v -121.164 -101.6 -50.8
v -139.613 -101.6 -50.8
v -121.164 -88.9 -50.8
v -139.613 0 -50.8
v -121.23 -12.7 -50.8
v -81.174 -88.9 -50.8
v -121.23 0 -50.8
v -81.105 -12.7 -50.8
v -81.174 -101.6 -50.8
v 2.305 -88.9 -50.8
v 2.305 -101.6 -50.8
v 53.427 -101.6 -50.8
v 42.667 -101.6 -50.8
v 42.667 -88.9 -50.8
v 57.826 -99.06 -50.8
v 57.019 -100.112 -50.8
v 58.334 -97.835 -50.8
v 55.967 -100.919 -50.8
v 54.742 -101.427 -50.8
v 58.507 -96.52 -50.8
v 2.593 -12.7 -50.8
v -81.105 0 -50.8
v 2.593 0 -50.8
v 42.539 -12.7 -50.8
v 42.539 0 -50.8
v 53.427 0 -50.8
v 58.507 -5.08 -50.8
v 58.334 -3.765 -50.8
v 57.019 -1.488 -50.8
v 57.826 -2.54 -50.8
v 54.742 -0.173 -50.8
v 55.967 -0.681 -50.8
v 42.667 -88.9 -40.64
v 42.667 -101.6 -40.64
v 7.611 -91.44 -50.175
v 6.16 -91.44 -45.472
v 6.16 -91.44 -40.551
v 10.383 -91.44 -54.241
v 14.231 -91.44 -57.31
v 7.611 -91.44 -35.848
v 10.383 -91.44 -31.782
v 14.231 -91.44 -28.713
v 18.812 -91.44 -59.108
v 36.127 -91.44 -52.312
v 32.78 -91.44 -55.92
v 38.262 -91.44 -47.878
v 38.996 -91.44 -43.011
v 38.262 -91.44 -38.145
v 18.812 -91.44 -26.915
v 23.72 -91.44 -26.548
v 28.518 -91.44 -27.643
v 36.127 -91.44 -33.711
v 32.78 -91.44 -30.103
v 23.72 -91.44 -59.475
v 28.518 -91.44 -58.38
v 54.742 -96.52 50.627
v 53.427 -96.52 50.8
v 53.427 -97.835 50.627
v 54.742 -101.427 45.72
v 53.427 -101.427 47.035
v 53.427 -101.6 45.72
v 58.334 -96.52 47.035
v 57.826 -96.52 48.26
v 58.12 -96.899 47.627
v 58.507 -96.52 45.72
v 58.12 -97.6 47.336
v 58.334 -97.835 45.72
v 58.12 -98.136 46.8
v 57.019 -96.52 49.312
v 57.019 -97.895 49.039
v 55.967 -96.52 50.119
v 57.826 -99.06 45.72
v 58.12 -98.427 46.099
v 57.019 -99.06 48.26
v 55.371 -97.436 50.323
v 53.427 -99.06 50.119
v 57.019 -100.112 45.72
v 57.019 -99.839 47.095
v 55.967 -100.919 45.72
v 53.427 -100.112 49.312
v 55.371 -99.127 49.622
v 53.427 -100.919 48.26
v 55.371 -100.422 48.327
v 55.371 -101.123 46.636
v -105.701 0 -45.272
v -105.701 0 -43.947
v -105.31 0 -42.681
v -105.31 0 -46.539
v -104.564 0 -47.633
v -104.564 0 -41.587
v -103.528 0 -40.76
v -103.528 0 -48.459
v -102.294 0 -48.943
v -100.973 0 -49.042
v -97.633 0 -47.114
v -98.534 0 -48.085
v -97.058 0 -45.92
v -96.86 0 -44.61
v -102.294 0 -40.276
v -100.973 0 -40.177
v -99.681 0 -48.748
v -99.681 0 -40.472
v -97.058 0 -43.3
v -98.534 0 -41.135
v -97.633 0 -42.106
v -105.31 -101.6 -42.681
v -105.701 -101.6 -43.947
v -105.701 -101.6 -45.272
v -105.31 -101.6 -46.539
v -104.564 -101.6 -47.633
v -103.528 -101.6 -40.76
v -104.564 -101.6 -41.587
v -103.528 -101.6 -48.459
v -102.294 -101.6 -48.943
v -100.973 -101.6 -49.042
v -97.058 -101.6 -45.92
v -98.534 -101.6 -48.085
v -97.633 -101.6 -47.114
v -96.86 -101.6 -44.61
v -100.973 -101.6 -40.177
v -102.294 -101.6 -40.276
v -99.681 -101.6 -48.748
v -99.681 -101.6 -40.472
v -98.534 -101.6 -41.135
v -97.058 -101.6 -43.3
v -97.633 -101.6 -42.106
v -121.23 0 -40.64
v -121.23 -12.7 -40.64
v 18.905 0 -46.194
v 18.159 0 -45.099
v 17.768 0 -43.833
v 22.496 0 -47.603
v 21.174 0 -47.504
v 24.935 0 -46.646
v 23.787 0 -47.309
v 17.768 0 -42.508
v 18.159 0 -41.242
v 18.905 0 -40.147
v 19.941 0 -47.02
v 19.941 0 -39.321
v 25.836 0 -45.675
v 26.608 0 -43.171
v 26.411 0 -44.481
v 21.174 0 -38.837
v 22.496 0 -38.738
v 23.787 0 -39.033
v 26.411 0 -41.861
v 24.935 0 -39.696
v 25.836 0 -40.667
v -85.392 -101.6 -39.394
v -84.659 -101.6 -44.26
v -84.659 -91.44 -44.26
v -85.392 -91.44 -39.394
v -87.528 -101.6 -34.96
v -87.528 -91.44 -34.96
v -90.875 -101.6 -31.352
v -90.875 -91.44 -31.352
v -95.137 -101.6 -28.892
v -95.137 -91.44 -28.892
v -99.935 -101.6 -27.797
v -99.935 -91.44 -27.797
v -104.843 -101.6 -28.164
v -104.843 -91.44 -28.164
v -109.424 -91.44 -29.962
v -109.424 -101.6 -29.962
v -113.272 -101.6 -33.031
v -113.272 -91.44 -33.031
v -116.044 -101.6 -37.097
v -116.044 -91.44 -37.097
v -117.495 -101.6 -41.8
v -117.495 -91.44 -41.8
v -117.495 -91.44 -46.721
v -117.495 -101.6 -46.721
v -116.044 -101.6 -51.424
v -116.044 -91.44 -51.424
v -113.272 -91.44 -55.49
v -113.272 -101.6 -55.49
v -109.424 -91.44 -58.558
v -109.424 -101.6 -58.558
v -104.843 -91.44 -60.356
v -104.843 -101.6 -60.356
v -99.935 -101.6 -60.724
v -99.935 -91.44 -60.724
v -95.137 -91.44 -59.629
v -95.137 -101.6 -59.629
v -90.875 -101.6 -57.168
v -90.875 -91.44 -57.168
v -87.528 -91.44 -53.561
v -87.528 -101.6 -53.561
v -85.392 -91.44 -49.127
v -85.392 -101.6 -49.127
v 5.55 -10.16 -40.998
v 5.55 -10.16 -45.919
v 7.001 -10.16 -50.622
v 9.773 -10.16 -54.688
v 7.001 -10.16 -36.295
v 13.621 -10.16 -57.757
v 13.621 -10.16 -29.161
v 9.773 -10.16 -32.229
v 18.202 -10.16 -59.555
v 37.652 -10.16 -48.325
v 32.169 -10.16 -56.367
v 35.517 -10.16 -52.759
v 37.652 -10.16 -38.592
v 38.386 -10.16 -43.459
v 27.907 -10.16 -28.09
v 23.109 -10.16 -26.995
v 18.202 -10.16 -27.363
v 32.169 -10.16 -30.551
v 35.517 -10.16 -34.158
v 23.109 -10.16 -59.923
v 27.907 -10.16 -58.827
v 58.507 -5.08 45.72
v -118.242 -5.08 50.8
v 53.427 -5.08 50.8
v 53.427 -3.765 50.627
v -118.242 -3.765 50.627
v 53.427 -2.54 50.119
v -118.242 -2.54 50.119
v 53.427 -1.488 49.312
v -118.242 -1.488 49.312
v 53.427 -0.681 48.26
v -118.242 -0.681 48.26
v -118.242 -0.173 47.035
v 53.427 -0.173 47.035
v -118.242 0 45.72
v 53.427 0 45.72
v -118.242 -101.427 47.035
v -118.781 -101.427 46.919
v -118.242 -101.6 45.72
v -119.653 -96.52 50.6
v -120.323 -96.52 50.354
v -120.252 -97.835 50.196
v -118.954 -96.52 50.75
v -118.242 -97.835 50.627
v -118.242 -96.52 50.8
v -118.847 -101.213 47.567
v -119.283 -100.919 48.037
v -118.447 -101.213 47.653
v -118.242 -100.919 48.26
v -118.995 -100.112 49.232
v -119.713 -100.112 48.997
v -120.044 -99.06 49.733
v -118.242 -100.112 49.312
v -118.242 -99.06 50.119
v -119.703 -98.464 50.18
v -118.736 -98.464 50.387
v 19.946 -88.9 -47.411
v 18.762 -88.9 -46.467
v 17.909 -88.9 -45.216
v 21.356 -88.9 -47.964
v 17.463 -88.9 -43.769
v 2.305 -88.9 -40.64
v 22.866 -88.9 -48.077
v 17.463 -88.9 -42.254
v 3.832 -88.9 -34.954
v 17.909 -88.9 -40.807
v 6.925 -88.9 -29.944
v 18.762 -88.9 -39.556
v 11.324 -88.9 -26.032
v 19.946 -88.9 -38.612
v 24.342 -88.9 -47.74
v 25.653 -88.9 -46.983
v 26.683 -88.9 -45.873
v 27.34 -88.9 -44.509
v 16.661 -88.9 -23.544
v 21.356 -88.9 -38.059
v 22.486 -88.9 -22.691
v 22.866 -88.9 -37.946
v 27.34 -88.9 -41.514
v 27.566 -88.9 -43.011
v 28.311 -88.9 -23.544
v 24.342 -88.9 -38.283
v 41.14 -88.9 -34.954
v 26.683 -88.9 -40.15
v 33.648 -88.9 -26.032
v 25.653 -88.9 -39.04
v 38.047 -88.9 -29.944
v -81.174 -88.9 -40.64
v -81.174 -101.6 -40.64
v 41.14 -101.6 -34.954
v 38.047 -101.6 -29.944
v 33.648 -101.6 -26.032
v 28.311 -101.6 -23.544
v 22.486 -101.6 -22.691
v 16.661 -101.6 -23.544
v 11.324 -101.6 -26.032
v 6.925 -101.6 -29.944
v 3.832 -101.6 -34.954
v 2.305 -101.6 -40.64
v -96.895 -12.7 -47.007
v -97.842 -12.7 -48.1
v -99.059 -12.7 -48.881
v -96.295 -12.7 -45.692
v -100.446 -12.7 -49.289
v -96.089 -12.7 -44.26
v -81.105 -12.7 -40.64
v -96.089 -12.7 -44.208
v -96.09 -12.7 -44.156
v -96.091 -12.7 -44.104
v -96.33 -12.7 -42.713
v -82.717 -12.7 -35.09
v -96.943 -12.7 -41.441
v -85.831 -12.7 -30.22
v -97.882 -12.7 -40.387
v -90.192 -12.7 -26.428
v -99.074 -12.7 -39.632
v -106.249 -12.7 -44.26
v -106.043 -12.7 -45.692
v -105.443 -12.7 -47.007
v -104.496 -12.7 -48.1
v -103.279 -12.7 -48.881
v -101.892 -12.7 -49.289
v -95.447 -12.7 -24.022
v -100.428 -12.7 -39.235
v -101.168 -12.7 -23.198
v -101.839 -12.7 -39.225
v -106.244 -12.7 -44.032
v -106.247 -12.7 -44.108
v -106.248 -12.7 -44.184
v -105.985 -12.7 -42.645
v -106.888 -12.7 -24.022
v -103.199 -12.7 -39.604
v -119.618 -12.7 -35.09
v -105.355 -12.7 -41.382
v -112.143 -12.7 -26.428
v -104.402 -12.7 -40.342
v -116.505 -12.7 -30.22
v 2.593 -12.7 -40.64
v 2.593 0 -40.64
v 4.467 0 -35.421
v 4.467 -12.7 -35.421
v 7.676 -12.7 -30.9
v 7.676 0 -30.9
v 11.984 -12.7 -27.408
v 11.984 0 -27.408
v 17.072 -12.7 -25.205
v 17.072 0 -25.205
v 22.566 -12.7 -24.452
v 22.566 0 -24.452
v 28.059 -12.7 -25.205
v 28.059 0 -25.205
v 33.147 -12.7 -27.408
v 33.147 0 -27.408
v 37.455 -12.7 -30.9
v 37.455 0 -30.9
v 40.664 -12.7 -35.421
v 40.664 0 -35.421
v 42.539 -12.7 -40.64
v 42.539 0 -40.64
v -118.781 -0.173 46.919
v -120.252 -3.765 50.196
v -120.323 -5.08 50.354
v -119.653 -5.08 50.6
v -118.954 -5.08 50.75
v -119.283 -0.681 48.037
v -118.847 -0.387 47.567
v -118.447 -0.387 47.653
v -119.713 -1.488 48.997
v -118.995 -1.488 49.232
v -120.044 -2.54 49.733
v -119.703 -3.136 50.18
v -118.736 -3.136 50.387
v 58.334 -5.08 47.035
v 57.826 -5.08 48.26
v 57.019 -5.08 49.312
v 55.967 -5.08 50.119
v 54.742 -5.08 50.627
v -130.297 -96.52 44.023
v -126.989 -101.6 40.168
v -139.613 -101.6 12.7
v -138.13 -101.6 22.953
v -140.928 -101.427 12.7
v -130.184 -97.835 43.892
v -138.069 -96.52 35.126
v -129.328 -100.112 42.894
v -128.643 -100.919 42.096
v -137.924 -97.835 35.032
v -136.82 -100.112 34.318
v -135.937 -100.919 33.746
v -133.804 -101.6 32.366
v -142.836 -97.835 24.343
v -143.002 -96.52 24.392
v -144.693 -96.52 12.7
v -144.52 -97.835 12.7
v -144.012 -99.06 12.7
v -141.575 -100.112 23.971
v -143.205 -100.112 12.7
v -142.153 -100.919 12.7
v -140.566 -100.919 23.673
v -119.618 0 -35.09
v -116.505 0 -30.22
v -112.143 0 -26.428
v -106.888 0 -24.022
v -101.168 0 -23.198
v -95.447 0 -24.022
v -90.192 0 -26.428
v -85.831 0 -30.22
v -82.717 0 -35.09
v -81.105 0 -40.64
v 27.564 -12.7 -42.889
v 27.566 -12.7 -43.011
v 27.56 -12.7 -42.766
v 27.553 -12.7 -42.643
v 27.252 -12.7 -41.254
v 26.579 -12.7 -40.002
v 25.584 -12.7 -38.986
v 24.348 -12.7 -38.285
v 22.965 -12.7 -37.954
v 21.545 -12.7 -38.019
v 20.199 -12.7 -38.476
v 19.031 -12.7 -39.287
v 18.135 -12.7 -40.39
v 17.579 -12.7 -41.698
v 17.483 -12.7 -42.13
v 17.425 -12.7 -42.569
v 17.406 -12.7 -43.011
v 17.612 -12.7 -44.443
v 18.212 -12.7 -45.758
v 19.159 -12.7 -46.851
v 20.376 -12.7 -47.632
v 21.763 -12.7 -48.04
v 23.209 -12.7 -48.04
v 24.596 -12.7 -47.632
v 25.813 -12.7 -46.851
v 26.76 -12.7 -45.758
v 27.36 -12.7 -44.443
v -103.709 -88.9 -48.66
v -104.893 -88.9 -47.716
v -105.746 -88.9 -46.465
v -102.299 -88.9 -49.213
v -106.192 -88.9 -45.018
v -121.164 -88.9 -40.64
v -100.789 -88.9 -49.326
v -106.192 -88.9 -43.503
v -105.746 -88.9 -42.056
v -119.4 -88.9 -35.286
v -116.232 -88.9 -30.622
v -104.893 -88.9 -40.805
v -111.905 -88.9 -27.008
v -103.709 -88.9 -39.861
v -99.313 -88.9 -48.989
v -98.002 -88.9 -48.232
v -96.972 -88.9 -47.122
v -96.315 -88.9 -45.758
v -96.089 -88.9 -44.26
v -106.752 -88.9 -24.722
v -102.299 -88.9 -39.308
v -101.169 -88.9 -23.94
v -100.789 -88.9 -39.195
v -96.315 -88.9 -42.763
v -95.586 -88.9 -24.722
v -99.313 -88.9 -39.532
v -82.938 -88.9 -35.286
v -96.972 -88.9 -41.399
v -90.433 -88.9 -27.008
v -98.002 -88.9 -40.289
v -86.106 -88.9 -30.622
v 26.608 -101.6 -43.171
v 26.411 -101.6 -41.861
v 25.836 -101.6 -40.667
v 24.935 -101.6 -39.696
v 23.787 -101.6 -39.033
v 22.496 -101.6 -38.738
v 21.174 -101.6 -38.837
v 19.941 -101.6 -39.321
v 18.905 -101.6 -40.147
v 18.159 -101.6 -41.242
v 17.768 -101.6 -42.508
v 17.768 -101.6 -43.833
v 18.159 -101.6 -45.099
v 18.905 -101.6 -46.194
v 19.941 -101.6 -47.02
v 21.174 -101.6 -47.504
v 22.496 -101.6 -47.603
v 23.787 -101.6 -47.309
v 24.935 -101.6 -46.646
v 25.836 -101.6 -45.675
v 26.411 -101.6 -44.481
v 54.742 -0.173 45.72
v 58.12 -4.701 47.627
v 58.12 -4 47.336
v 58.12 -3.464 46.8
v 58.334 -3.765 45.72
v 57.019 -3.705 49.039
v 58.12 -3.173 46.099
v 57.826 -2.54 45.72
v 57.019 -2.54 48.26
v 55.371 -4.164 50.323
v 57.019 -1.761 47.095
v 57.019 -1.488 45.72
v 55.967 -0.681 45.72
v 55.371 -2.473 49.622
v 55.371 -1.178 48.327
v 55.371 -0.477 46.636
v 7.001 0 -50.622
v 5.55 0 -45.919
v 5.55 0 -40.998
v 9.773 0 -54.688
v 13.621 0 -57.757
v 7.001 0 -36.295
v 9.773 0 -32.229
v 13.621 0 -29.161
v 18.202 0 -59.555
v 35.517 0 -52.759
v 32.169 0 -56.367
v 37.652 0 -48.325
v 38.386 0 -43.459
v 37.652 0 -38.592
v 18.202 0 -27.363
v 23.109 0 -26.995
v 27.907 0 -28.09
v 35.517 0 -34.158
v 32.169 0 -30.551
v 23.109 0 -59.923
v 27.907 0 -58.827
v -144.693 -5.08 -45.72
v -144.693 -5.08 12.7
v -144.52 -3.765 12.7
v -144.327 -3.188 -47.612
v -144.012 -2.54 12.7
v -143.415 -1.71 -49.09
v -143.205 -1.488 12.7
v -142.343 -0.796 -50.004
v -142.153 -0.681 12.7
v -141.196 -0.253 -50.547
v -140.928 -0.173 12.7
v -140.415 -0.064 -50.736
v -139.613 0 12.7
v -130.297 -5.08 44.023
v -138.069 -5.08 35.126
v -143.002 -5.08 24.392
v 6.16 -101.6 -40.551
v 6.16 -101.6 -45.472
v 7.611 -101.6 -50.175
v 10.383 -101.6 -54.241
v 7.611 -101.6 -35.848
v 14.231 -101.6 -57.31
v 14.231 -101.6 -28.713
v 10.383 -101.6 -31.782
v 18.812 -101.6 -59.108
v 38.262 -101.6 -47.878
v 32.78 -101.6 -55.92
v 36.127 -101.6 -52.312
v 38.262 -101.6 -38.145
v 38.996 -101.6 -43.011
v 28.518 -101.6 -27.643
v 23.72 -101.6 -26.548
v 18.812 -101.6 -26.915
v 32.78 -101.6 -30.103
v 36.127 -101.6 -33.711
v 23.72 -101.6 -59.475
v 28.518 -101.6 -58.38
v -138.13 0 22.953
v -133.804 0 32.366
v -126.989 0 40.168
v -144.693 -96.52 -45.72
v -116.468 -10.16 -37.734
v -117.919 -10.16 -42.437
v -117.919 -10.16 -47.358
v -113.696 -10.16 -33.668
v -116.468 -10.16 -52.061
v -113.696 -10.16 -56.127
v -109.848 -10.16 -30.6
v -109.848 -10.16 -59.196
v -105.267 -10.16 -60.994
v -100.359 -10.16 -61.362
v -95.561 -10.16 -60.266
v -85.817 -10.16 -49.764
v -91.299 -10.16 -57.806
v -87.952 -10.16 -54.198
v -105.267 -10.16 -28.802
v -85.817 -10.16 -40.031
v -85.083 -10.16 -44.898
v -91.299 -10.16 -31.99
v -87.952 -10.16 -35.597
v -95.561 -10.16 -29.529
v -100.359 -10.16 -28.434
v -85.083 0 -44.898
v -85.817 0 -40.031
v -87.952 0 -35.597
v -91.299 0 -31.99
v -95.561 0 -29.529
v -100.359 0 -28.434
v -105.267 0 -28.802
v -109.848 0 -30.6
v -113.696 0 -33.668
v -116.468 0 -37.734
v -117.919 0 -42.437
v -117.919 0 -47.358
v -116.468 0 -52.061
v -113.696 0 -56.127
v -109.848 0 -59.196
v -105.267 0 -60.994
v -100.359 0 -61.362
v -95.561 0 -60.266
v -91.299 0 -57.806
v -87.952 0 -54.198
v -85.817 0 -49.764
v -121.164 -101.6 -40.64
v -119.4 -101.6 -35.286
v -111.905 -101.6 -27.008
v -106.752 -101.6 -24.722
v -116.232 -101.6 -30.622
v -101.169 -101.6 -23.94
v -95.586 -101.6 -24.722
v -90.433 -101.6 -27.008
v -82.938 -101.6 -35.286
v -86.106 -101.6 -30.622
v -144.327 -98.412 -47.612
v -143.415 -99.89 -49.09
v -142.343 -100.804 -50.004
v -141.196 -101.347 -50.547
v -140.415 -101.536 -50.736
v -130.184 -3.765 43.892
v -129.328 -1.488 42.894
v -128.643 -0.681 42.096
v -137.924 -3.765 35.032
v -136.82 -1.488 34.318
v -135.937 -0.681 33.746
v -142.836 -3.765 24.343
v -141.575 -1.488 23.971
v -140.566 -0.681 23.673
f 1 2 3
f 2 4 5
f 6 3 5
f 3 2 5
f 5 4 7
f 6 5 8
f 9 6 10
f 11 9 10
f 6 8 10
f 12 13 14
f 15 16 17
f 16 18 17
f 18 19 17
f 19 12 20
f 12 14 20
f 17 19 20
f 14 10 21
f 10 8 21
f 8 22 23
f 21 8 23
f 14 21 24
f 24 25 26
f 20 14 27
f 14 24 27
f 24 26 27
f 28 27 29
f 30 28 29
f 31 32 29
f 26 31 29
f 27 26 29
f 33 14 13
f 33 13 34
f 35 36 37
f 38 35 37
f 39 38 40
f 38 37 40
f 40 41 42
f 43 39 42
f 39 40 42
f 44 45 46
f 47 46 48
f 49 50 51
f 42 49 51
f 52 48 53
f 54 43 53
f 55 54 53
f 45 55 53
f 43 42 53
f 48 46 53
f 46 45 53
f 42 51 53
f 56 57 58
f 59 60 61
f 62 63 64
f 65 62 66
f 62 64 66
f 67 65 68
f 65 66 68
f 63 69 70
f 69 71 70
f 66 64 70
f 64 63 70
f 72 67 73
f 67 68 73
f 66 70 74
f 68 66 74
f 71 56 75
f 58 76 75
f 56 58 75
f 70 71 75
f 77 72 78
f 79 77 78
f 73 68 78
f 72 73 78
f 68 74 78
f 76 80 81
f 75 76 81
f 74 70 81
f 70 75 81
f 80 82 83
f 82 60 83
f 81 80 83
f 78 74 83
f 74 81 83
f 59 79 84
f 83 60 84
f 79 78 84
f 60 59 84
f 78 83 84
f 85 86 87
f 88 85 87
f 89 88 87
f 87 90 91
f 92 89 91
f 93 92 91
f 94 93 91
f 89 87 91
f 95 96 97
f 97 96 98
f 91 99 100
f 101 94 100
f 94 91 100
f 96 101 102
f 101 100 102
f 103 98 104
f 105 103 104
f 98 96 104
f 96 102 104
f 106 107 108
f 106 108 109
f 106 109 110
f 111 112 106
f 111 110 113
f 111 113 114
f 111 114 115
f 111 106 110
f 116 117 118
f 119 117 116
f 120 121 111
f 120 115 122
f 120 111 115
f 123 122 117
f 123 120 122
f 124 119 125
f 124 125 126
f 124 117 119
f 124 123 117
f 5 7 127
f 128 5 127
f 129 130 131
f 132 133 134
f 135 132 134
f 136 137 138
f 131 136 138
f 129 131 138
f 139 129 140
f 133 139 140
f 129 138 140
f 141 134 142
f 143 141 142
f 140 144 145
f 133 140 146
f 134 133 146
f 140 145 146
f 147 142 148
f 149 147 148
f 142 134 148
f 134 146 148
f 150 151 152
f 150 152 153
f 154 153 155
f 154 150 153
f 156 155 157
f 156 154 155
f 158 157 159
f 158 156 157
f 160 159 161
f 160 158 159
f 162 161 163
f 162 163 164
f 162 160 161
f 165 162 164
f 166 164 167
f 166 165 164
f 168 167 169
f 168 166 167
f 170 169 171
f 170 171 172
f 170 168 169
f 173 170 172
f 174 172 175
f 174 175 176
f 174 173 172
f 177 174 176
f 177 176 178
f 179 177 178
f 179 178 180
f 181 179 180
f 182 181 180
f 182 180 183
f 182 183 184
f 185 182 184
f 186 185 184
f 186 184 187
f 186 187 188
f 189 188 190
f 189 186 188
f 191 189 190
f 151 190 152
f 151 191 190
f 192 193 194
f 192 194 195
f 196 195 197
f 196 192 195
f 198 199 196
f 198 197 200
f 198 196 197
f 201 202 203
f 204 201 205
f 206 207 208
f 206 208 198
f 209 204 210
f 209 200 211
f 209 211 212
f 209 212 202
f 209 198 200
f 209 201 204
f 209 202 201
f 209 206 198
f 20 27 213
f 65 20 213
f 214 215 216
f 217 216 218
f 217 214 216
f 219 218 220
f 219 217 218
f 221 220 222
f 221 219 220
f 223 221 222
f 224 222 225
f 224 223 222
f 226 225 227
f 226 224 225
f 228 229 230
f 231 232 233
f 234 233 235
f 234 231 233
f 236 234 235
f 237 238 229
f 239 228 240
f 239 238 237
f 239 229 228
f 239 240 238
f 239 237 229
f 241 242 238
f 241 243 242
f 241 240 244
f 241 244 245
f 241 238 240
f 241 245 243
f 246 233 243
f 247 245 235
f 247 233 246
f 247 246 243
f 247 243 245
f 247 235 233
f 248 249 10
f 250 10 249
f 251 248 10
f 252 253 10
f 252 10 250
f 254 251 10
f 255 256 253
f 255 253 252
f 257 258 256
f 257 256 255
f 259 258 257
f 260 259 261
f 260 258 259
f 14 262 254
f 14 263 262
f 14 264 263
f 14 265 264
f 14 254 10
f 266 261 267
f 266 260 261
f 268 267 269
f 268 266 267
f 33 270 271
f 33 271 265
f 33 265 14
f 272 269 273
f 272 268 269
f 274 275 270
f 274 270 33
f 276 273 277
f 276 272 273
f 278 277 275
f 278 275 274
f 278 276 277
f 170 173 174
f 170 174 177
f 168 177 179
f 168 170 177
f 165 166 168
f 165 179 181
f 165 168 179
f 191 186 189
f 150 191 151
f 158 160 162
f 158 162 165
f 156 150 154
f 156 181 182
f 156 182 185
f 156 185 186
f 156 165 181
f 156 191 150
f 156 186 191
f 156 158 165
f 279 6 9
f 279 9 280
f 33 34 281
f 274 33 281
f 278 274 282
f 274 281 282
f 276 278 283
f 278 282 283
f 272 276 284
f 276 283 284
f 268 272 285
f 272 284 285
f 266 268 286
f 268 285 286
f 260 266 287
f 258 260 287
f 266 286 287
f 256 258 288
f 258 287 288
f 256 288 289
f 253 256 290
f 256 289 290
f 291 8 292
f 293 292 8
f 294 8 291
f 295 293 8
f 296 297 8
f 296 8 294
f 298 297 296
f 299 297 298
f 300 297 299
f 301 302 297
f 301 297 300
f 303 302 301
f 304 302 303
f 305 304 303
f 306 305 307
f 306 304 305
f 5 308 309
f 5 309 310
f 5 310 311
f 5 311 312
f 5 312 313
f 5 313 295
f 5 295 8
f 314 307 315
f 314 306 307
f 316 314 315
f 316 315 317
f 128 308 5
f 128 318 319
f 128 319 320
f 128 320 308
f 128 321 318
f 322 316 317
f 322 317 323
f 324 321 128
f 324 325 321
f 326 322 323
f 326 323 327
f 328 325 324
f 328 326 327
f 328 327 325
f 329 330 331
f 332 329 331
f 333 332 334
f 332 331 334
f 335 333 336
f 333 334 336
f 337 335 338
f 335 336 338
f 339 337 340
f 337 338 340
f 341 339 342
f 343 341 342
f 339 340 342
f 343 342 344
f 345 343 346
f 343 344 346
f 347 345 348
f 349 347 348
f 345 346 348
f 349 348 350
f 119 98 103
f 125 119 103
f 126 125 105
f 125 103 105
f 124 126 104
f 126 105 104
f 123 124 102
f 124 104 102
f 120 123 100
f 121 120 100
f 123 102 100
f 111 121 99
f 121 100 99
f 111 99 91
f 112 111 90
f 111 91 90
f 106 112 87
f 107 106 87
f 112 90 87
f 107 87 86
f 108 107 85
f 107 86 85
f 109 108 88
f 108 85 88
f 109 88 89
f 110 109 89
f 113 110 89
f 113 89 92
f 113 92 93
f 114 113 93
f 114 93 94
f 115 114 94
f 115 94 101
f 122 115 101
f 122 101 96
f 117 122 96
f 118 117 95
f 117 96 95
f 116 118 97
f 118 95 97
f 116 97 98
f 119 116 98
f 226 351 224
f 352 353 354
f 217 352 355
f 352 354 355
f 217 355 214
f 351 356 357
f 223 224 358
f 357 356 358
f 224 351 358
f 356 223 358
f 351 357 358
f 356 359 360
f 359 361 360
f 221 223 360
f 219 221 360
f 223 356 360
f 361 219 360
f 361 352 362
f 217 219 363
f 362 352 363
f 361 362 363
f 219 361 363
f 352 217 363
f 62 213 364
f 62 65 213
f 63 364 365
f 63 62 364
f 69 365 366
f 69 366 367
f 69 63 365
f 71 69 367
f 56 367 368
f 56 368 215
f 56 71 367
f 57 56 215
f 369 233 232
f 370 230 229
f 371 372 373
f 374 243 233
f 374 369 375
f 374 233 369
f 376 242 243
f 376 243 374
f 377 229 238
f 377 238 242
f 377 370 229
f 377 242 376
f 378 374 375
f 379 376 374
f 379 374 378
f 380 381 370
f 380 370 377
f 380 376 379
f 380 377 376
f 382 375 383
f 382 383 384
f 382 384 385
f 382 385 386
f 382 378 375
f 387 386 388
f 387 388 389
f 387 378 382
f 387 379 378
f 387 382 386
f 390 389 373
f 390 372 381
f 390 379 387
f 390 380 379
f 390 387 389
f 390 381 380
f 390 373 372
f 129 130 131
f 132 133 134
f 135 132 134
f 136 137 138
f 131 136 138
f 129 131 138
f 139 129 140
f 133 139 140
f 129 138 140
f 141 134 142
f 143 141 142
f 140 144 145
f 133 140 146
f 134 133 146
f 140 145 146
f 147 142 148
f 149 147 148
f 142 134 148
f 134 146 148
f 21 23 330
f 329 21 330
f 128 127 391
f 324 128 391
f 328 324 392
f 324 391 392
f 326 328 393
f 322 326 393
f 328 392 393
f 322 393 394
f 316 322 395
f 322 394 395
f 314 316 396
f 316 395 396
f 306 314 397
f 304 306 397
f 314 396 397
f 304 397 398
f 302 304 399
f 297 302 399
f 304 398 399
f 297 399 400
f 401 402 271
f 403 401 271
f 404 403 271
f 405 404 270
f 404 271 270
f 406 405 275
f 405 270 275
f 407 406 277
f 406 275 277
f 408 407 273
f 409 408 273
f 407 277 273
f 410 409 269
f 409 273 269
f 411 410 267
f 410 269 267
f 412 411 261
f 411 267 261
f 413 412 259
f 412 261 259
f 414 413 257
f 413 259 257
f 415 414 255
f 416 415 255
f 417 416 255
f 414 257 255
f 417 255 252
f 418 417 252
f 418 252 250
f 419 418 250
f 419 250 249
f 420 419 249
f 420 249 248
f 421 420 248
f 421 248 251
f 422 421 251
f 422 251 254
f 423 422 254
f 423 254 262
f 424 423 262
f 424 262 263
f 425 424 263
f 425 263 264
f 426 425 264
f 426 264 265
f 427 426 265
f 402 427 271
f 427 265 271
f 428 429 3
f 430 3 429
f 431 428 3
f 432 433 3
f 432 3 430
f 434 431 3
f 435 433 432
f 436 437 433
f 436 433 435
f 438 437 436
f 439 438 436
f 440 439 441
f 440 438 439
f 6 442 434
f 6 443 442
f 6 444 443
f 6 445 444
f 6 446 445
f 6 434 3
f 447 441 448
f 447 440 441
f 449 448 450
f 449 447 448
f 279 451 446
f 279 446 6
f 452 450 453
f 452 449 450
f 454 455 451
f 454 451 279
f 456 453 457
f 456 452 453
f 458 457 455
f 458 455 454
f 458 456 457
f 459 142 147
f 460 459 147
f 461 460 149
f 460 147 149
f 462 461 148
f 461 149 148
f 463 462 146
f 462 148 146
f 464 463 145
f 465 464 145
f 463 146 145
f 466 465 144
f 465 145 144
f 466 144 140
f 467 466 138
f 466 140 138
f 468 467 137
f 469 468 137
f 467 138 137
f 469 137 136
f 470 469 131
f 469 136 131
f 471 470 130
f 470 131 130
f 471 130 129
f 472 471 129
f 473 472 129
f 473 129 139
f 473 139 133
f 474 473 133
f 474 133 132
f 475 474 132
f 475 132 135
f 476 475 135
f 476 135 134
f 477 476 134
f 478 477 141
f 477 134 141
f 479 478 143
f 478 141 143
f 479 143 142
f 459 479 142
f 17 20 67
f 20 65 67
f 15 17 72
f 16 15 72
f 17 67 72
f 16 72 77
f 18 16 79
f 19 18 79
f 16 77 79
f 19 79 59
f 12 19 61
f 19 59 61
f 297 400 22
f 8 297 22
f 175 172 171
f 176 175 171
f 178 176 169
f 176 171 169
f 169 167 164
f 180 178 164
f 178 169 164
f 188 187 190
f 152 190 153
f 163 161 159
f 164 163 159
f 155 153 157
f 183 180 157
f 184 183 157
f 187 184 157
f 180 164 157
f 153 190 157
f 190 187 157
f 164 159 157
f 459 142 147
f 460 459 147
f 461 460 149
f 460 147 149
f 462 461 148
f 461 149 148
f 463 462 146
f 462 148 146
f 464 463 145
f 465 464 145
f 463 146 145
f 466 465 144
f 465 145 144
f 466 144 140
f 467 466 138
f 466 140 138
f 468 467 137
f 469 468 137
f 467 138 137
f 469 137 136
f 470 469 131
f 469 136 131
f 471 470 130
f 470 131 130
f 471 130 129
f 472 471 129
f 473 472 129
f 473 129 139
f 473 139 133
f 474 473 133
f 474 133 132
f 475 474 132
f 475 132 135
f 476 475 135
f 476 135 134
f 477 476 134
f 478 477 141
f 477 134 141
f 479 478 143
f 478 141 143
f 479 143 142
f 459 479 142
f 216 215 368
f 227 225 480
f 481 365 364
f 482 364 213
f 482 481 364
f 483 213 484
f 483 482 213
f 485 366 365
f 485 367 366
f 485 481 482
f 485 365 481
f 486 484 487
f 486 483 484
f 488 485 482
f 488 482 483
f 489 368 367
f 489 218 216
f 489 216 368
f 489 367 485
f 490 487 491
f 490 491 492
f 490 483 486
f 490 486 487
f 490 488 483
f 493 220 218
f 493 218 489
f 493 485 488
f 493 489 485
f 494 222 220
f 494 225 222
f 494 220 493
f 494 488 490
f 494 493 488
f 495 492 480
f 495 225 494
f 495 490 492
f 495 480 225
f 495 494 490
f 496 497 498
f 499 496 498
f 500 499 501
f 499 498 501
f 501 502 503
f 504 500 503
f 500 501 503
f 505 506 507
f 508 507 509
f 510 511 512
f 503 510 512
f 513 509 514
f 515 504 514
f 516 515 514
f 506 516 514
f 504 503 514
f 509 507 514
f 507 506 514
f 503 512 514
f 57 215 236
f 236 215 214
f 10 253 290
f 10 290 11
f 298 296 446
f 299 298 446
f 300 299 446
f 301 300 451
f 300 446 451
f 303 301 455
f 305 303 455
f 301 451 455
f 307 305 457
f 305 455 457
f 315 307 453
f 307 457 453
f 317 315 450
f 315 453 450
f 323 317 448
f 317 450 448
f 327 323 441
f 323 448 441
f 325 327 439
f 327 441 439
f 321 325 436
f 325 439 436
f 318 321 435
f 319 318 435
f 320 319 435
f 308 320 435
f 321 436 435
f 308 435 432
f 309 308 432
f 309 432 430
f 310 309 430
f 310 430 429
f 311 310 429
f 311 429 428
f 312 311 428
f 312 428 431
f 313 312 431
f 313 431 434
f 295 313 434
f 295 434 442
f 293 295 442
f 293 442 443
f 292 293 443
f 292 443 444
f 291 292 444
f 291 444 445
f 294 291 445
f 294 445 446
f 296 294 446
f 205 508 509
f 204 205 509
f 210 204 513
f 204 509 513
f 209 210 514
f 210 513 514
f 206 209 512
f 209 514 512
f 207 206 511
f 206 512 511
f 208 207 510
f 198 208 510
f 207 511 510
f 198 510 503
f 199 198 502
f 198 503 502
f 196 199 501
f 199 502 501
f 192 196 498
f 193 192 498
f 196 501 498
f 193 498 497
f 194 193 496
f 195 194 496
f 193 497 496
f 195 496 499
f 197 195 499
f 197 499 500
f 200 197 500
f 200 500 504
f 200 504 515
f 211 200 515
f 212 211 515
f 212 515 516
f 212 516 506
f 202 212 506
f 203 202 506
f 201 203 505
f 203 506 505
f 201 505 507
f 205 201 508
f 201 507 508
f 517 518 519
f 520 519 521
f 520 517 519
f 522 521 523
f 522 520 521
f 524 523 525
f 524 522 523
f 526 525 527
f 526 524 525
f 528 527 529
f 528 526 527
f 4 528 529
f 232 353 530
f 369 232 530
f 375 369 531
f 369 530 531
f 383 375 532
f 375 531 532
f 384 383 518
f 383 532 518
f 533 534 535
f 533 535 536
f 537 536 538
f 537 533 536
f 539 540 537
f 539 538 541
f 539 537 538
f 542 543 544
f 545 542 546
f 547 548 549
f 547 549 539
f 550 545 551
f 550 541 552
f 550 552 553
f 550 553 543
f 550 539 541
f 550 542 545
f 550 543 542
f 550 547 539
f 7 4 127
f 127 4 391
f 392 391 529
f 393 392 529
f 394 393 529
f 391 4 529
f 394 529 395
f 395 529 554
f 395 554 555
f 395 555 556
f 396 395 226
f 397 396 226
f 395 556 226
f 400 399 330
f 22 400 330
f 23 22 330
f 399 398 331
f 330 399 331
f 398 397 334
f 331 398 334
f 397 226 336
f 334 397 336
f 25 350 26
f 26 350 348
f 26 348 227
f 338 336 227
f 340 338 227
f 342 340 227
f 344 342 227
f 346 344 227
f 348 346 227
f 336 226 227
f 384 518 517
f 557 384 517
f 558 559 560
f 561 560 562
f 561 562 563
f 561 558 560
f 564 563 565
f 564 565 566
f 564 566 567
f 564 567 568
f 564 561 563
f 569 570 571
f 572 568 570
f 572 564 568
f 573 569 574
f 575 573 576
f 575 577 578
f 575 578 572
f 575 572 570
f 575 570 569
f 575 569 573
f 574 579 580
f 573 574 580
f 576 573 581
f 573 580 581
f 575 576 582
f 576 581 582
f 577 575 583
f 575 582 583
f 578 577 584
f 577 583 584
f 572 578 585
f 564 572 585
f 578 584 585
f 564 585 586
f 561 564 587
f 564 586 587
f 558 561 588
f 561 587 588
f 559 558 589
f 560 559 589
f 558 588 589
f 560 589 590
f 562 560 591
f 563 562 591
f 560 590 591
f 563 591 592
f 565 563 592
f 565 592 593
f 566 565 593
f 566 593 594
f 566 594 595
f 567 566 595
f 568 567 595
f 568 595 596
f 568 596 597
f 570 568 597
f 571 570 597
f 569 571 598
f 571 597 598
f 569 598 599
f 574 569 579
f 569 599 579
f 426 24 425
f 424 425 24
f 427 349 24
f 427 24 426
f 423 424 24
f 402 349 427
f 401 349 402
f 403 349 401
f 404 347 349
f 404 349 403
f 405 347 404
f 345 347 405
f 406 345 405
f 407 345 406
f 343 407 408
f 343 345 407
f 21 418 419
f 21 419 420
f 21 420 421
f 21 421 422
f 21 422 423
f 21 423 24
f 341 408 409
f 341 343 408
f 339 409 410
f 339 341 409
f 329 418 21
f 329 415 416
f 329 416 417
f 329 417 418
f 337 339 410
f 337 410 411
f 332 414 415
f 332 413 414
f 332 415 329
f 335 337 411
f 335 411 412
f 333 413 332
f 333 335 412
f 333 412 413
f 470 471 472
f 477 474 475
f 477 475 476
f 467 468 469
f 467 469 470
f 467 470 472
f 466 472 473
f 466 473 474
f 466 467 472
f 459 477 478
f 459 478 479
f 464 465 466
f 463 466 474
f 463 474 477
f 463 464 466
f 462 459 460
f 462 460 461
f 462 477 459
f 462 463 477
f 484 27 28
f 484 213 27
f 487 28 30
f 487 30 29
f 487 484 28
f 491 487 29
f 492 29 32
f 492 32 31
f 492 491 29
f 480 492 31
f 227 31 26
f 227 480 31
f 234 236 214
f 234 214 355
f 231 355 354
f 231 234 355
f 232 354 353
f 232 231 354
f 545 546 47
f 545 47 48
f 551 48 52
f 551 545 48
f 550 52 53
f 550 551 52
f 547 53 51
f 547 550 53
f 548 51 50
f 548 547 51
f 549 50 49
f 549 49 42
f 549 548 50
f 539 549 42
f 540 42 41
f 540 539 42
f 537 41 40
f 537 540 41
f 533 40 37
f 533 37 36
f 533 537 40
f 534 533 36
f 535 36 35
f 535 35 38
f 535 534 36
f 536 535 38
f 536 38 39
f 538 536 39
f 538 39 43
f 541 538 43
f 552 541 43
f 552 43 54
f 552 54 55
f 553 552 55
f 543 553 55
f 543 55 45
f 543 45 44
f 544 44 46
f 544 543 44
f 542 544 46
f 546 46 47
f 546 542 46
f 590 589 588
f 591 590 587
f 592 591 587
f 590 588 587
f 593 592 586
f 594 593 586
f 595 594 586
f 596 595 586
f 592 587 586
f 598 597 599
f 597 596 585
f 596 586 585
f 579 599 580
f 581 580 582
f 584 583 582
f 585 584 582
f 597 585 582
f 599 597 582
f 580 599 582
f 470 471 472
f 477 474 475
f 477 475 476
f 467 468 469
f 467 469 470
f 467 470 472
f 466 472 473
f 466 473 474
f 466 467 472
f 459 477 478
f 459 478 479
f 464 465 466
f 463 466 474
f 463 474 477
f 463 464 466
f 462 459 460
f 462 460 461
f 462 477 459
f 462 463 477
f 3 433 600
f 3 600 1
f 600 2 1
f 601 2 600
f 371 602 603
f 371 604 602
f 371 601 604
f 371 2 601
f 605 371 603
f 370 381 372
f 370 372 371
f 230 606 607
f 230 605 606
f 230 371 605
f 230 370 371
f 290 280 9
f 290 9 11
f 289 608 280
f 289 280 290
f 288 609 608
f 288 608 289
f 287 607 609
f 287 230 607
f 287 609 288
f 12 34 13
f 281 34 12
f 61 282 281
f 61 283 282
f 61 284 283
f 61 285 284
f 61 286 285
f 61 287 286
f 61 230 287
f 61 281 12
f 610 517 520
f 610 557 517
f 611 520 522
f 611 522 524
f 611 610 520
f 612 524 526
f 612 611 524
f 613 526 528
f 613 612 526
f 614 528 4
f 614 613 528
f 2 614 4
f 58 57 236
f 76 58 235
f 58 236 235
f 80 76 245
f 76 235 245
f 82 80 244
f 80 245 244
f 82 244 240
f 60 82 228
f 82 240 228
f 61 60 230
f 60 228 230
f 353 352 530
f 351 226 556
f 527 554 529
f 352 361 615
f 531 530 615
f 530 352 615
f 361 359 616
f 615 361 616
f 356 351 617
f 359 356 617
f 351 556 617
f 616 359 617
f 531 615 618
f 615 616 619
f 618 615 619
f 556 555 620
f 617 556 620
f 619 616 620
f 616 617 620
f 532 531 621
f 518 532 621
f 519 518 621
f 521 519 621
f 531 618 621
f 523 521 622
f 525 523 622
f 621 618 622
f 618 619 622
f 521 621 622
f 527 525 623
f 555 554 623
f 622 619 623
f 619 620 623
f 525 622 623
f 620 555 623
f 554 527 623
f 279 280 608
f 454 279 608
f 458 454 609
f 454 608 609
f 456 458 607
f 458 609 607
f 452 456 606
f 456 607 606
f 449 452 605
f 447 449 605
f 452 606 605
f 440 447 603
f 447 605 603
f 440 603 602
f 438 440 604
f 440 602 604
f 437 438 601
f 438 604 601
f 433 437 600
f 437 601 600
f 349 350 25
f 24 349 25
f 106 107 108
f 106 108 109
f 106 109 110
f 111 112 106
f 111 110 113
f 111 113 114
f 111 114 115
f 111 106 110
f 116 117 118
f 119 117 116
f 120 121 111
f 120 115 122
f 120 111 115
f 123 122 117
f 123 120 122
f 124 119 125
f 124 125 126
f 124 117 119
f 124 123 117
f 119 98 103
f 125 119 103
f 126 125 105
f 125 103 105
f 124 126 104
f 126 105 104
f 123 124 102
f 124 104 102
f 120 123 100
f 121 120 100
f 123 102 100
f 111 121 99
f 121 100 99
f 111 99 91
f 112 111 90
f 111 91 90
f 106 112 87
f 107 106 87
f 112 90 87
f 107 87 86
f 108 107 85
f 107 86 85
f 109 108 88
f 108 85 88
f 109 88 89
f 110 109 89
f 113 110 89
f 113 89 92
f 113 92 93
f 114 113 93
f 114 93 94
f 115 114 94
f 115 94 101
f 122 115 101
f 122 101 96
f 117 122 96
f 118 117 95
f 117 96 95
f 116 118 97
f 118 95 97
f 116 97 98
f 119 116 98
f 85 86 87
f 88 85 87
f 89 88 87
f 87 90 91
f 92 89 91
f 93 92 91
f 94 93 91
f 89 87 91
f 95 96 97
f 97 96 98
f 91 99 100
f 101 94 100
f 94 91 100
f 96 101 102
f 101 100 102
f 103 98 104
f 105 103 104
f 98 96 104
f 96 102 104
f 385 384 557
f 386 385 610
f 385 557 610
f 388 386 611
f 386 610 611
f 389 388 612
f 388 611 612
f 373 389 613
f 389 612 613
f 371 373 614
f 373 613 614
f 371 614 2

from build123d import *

# Parameters (mm, degrees)
F1_DEPTH  = 101.6
F2_R      = 5.08
F3_R      = 5.08
F4_DEPTH  = 12.7
F5_DEPTH  = 101.6
F7_DEPTH  = 12.7
F8_R      = 4.445
F9_DEPTH  = 101.6
F10_DEPTH = 101.6
F11_R     = 16.51
F12_DEPTH = 10.16
F13_R     = 16.51
F14_DEPTH = 10.16


with BuildPart() as f1:
    # F0 (on Front) → F1 (new body)
    with BuildSketch(Plane.XZ):
        with BuildLine():
            Line((58.5069581866, -50.8), (58.5069581866, 0))
            Line((58.5069581866, 0), (58.5069581866, 50.8))
            Line((58.5069581866, 50.8), (-119.2930418134, 50.8))
            ThreePointArc((-119.2930418134, 50.8), (-137.7609177122, 35.5952505992), (-144.6930418134, 12.7))
            Line((-144.6930418134, 12.7), (-144.6930418134, -50.8))
            Line((-144.6930418134, -50.8), (58.5069581866, -50.8))
        make_face()
    extrude(amount=F1_DEPTH)

    # F2
    f2_edges = [f1.edges().sort_by_distance(p)[0] for p in [
        (-30.393042, 0, 50.8),
        (-119.293042, -50.8, 50.8),
        (-137.760918, 0, 35.595251),
        (-144.693042, 0, -19.05),
        (-144.693042, -101.6, -19.05),
        (-137.760918, -101.6, 35.595251),
        (-30.393042, -101.6, 50.8),
        (58.506958, -50.8, 50.8),
        (58.506958, 0, 0),
        (58.506958, -101.6, 0),
        (-144.693042, -50.8, -50.8),
    ]]
    fillet(f2_edges, radius=F2_R)

    # F3 (on face) → F4 (cut)
    with BuildSketch(Plane.XZ.offset(101.6)):
        with BuildLine():
            Line((-121.1638599634, -40.64), (-121.1638599634, -50.8))
            Line((-121.1638599634, -50.8), (-81.1741036591, -50.8))
            Line((-81.1741036591, -50.8), (-81.1741036591, -40.64))
            ThreePointArc((-81.1741036591, -40.64), (-101.1689818113, -23.9403933046), (-121.1638599634, -40.64))
        make_face()
        with Locations((-101.1689818113, -44.2603933046)):
            Circle(F3_R, mode=Mode.SUBTRACT)
        with BuildLine():
            Line((2.304810565, -40.64), (2.304810565, -50.8))
            Line((2.304810565, -50.8), (42.6670909313, -50.8))
            Line((42.6670909313, -50.8), (42.6670909313, -40.64))
            ThreePointArc((42.6670909313, -40.64), (22.4859507481, -22.6914933917), (2.304810565, -40.64))
        make_face()
        with Locations((22.4859507481, -43.0114933917)):
            Circle(F3_R, mode=Mode.SUBTRACT)
    extrude(amount=-F4_DEPTH, mode=Mode.SUBTRACT)

    # F5 (cut): faces of the model
    f5_faces = [f1.faces().sort_by_distance(p)[0] for p in [
        (-101.1689818113, -101.6, -44.2603933046),
        (22.4859507481, -101.6, -43.0114933917),
    ]]
    extrude(f5_faces, amount=-F5_DEPTH, mode=Mode.SUBTRACT)

    # F6 (on face) → F7 (cut)
    with BuildSketch(Plane(origin=(0, 0, 0), x_dir=(-1, 0, 0), z_dir=(0, 1, 0))):
        with BuildLine():
            Line((-2.5926139206, -41.6983120407), (-17.5786139206, -41.6983120407))
            ThreePointArc((-17.5786139206, -41.6983120407), (-17.4493015106, -42.3492513982), (-17.4059507481, -43.0114933917))
            ThreePointArc((-17.4059507481, -43.0114933917), (-22.6701544481, -48.0881526276), (-27.5525920855, -42.6433282679))
            Line((-27.5525920855, -42.6433282679), (-42.5385920855, -42.6433282679))
            Line((-42.5385920855, -42.6433282679), (-42.5385920855, -50.8))
            Line((-42.5385920855, -50.8), (-2.5926139206, -50.8))
            Line((-2.5926139206, -50.8), (-2.5926139206, -41.6983120407))
        make_face()
        with BuildLine():
            Line((81.1054025969, -44.1035834766), (81.1054025969, -50.8))
            Line((81.1054025969, -50.8), (121.2298573264, -50.8))
            Line((121.2298573264, -50.8), (121.2298573264, -44.0322738067))
            Line((121.2298573264, -44.0322738067), (106.2438573264, -44.0322738067))
            ThreePointArc((106.2438573264, -44.0322738067), (106.2477005285, -44.1463047801), (106.2489818113, -44.2603933046))
            ThreePointArc((106.2489818113, -44.2603933046), (101.0905675549, -49.3397880722), (96.0914025969, -44.1035834766))
            Line((96.0914025969, -44.1035834766), (81.1054025969, -44.1035834766))
        make_face()
        with BuildLine():
            Line((81.1054025969, -40.64), (81.1054025969, -44.1035834766))
            Line((81.1054025969, -44.1035834766), (96.0914025969, -44.1035834766))
            ThreePointArc((96.0914025969, -44.1035834766), (101.1333013579, -39.1805186108), (106.2438573264, -44.0322738067))
            Line((106.2438573264, -44.0322738067), (121.2298573264, -44.0322738067))
            Line((121.2298573264, -44.0322738067), (121.2298573264, -40.64))
            ThreePointArc((121.2298573264, -40.64), (101.1676299617, -23.1976156262), (81.1054025969, -40.64))
        make_face()
        with BuildLine():
            ThreePointArc((-27.5525920855, -42.6433282679), (-22.9651254544, -37.9541431368), (-17.5786139206, -41.6983120407))
            Line((-17.5786139206, -41.6983120407), (-2.5926139206, -41.6983120407))
            Line((-2.5926139206, -41.6983120407), (-2.5926139206, -40.64))
            ThreePointArc((-2.5926139206, -40.64), (-22.565603003, -24.4518259035), (-42.5385920855, -40.64))
            Line((-42.5385920855, -40.64), (-42.5385920855, -42.6433282679))
            Line((-42.5385920855, -42.6433282679), (-27.5525920855, -42.6433282679))
        make_face()
    extrude(amount=-F7_DEPTH, mode=Mode.SUBTRACT)


with BuildPart() as f9:
    # F8 (on Front) → F9 (new body)
    with BuildSketch(Plane.XZ):
        with Locations((-101.3052612543, -44.6098931134)):
            Circle(F8_R)
    extrude(amount=F9_DEPTH)


with BuildPart() as f9b:
    # F8 (on Front) → F9, piece 2 (new body)
    with BuildSketch(Plane.XZ):
        with Locations((22.1634022892, -43.1708656251)):
            Circle(F8_R)
    extrude(amount=F9_DEPTH)


with BuildPart() as f10:
    # F8 (on Front) → F10 (new body)
    with BuildSketch(Plane.XZ):
        with Locations((-101.3052612543, -44.6098931134)):
            Circle(F8_R)
    extrude(amount=F10_DEPTH)


with BuildPart() as f10b:
    # F8 (on Front) → F10, piece 2 (new body)
    with BuildSketch(Plane.XZ):
        with Locations((22.1634022892, -43.1708656251)):
            Circle(F8_R)
    extrude(amount=F10_DEPTH)


with BuildPart() as f12:
    # F11 (on Front) → F12 (new body)
    with BuildSketch(Plane.XZ):
        with Locations((21.8755975366, -43.4586666524)):
            Circle(F11_R)
    extrude(amount=F12_DEPTH)


with BuildPart() as f12b:
    # F11 (on Front) → F12, piece 2 (new body)
    with BuildSketch(Plane.XZ):
        with Locations((-101.5930697322, -44.897697866)):
            Circle(F11_R)
    extrude(amount=F12_DEPTH)


with BuildPart() as f14:
    # F13 (on face) → F14 (new body)
    with BuildSketch(Plane.XZ.offset(101.6)):
        with Locations((-101.1689818113, -44.2603933046)):
            Circle(F13_R)
    extrude(amount=-F14_DEPTH)


with BuildPart() as f14b:
    # F13 (on face) → F14, piece 2 (new body)
    with BuildSketch(Plane.XZ.offset(101.6)):
        with Locations((22.4859507481, -43.0114933917)):
            Circle(F13_R)
    extrude(amount=-F14_DEPTH)


solid = Compound([f1.part, f9.part, f9b.part, f10.part, f10b.part, f12.part, f12b.part, f14.part, f14b.part])
